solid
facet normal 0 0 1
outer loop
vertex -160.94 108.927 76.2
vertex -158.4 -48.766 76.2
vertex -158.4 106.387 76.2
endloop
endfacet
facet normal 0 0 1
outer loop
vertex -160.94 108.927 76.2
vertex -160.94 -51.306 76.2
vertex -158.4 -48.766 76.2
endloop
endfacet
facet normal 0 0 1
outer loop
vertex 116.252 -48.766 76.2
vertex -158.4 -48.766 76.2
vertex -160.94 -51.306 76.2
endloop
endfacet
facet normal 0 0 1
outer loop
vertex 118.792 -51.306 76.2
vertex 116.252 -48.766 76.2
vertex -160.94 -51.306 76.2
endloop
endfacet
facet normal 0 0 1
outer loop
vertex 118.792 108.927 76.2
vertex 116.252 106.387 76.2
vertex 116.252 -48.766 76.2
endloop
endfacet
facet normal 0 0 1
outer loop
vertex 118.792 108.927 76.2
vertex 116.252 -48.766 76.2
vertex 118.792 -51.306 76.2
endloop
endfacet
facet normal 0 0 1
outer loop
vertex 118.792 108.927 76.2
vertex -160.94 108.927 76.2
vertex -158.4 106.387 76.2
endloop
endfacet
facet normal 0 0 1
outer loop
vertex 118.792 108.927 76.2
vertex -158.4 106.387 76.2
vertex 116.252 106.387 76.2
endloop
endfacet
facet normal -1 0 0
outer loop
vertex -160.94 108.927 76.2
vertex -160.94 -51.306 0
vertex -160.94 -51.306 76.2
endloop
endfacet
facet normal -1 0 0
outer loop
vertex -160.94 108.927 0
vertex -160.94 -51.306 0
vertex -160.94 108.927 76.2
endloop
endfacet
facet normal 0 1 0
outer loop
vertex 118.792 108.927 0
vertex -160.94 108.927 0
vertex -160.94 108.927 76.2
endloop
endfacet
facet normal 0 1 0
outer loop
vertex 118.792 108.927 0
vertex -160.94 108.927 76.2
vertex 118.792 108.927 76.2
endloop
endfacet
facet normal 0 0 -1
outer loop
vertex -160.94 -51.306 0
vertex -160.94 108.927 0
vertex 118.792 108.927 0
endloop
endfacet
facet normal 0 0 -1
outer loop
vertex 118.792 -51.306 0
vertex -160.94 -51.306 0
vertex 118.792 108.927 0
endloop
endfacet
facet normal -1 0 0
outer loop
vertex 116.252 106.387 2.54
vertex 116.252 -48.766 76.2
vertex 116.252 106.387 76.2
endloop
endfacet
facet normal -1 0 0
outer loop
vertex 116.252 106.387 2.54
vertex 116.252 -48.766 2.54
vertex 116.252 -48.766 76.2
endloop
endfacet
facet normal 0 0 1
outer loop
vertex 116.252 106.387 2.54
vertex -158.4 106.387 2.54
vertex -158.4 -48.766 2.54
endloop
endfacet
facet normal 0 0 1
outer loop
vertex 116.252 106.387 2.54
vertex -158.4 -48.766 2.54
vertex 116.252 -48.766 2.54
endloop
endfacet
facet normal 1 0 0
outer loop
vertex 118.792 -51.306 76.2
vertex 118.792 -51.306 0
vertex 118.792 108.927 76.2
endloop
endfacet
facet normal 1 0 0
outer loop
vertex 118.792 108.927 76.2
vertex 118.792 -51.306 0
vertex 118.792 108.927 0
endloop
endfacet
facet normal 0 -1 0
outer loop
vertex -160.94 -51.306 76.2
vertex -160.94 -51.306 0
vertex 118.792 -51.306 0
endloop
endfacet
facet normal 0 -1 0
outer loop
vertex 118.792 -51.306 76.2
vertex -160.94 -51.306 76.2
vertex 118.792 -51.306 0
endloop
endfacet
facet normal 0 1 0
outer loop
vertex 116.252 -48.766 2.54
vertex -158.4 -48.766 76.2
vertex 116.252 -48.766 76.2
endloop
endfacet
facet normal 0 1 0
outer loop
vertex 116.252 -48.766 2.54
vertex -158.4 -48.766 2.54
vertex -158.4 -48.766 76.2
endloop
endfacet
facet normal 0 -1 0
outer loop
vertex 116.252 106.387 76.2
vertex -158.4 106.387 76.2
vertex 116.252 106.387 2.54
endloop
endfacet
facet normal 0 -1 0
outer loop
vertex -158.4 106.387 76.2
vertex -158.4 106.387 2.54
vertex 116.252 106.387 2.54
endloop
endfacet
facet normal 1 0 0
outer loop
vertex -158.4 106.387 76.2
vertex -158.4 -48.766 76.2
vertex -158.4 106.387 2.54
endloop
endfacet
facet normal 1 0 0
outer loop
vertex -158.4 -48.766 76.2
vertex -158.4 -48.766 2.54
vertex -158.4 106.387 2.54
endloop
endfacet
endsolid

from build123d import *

# Parameters (mm, degrees)
F0_W     = 132.6081287116
F0_H     = 90.7132923603
F1_DEPTH = 76.2
F3_W     = 279.7318845987
F3_H     = 160.2330692112
F4_DEPTH = 76.2
F5_T     = -2.54


with BuildPart() as f1:
    # F0 (on Right) → F1 (new body)
    with BuildSketch(Plane.YZ):
        with Locations((-39.4802326337, -12.3488530517)):
            Rectangle(F0_W, F0_H)
    extrude(amount=F1_DEPTH)


with BuildPart() as f4:
    # F3 (on Top) → F4 (new body)
    with BuildSketch(Plane.XY):
        with Locations((-21.0741087794, 28.8107972592)):
            Rectangle(F3_W, F3_H)
    extrude(amount=F4_DEPTH)

    # F5
    f5_openings = [f4.faces().sort_by_distance(p)[0] for p in [
        (-21.074109, 28.810797, 76.2),
    ]]
    offset(amount=F5_T, openings=f5_openings)


solid = f4.part
